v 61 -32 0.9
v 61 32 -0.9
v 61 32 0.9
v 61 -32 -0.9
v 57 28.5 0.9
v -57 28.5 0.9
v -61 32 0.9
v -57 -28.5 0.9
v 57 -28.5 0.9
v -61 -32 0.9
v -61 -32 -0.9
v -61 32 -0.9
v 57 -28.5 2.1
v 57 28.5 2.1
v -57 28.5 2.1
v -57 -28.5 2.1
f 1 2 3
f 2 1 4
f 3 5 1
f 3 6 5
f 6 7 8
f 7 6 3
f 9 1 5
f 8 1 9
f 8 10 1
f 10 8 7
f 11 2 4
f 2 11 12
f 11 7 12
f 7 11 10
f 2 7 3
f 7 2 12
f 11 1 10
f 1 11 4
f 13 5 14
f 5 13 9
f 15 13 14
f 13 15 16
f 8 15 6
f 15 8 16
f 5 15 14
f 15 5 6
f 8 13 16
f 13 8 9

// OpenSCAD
plate_dim_outer=[
    122,
    64,
    1.8
];

plate_dim_inner=[
    114,
    57,
    2.6
];

module Plate() {
    cube(plate_dim_outer, center=true);
    translate([0,0, plate_dim_inner.z - plate_dim_outer.z]) cube(plate_dim_inner, center=true);
}

Plate();
